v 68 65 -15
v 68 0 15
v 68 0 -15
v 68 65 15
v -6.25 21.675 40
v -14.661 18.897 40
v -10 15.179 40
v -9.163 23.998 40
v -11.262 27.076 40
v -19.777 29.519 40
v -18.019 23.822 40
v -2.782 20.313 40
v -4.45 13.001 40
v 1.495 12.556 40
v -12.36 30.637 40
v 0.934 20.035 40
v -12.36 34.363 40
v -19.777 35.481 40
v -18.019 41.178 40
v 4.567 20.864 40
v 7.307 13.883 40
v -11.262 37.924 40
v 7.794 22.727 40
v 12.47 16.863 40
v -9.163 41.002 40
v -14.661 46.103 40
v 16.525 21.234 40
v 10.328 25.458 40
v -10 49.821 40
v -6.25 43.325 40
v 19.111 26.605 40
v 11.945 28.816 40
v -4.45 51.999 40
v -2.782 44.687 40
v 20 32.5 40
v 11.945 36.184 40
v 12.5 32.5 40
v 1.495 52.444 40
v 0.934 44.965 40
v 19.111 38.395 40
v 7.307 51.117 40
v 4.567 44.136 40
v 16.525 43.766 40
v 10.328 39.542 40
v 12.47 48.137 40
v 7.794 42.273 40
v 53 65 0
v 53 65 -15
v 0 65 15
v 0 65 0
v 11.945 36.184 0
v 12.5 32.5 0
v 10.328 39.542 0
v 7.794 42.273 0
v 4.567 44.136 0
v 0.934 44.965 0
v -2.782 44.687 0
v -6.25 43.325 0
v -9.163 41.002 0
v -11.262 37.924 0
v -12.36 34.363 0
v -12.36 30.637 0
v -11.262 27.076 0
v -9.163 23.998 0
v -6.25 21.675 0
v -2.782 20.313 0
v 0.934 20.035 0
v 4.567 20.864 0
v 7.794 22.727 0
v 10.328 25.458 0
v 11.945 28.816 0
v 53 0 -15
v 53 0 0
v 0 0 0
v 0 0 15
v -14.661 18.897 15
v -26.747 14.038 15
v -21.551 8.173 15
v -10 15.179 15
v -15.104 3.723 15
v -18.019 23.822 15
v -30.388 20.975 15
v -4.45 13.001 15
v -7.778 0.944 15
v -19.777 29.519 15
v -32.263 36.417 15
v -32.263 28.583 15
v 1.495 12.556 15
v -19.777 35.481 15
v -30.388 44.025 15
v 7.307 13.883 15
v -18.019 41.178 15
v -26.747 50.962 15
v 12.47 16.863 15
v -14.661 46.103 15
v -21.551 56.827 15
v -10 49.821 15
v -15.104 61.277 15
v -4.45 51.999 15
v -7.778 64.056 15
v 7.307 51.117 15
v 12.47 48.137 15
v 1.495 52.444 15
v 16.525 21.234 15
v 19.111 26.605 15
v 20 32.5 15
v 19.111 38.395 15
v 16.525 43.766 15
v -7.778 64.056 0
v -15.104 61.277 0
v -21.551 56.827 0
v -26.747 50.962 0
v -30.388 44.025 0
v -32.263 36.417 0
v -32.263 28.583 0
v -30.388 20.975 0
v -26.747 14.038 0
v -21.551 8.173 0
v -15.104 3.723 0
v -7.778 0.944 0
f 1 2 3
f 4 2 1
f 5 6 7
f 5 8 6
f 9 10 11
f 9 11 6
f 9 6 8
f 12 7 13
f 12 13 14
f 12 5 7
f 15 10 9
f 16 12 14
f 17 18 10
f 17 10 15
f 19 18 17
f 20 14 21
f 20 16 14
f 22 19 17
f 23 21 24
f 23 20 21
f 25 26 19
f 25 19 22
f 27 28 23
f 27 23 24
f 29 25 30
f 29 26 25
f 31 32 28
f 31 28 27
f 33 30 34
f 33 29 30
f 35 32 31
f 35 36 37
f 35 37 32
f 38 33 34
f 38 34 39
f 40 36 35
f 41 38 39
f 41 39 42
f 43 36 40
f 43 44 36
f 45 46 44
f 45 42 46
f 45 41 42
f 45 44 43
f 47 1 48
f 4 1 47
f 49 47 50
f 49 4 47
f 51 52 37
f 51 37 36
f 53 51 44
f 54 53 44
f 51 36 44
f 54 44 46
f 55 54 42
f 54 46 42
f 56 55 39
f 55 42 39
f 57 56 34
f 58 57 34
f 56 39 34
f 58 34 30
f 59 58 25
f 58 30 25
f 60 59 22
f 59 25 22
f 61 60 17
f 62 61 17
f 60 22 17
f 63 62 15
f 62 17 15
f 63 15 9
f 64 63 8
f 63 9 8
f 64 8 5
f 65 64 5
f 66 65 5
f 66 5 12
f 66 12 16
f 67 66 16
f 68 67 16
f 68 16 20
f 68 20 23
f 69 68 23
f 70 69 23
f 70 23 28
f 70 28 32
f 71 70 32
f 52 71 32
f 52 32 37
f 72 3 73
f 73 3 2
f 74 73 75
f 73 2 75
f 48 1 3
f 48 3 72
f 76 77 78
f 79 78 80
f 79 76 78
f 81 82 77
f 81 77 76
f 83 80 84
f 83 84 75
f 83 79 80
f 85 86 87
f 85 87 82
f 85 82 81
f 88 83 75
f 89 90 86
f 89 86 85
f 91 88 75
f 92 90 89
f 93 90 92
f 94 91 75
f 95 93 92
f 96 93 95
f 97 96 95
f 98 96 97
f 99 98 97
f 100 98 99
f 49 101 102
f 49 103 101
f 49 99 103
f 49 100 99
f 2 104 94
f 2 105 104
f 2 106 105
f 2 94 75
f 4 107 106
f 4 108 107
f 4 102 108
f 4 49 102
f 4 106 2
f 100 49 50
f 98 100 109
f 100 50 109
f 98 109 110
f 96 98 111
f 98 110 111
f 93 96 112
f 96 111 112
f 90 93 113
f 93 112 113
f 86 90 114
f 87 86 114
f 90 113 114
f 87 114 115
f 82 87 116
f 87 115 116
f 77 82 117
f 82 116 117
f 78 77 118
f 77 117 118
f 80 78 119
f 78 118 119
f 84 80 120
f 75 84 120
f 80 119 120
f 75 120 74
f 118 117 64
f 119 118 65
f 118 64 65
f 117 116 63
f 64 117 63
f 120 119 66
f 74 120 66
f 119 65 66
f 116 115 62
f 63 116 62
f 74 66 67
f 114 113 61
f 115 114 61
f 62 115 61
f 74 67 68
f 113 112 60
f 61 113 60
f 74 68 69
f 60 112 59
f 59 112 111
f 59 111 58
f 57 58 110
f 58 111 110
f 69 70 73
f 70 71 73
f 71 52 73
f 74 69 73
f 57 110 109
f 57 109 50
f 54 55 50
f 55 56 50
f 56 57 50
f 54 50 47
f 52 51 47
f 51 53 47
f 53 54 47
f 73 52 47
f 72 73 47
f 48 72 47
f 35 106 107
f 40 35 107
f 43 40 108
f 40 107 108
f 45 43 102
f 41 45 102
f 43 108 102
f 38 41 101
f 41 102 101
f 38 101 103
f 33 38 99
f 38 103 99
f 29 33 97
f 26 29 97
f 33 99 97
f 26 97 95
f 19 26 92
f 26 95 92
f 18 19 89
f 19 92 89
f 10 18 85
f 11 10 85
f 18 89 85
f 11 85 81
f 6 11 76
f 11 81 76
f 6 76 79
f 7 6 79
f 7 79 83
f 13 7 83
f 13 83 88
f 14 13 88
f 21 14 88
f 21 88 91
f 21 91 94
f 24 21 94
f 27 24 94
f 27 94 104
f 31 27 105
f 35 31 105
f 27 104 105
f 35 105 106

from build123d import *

# Parameters (mm, degrees)
BOSS_EXTRUDE1_DEPTH = 15
SKETCH2_R           = 20
BOSS_EXTRUDE2_DEPTH = 25
SKETCH3_R           = 12.5
CUT_EXTRUDE1_DEPTH  = 103.220350224
SKETCH4_W           = 15
SKETCH4_H           = 65
BOSS_EXTRUDE3_DEPTH = 15


with BuildPart() as part:
    # Sketch1 → Boss-Extrude1 (new body)
    with BuildSketch(Plane.XY):
        with BuildLine():
            Line((0, 0), (68, 0))
            Line((68, 0), (68, 65))
            Line((68, 65), (0, 65))
            ThreePointArc((0, 65), (-32.5, 32.5), (0, 0))
        make_face()
    extrude(amount=BOSS_EXTRUDE1_DEPTH)

    # Sketch2 → Boss-Extrude2 (add)
    with BuildSketch(Plane.XY.offset(15)):
        with Locations((0, 32.5)):
            Circle(SKETCH2_R)
    extrude(amount=BOSS_EXTRUDE2_DEPTH)

    # Sketch3 → Cut-Extrude1 (cut, through all)
    with BuildSketch(Plane.XY.offset(40)):
        with Locations((0, 32.5)):
            Circle(SKETCH3_R)
    extrude(amount=-CUT_EXTRUDE1_DEPTH, mode=Mode.SUBTRACT)

    # Sketch4 → Boss-Extrude3 (add)
    with BuildSketch(Plane(origin=(0, 0, 0), x_dir=(-1, 0, 0), z_dir=(0, 0, -1))):
        with Locations((-60.5, 32.5)):
            Rectangle(SKETCH4_W, SKETCH4_H)
    extrude(amount=BOSS_EXTRUDE3_DEPTH)


solid = part.part
